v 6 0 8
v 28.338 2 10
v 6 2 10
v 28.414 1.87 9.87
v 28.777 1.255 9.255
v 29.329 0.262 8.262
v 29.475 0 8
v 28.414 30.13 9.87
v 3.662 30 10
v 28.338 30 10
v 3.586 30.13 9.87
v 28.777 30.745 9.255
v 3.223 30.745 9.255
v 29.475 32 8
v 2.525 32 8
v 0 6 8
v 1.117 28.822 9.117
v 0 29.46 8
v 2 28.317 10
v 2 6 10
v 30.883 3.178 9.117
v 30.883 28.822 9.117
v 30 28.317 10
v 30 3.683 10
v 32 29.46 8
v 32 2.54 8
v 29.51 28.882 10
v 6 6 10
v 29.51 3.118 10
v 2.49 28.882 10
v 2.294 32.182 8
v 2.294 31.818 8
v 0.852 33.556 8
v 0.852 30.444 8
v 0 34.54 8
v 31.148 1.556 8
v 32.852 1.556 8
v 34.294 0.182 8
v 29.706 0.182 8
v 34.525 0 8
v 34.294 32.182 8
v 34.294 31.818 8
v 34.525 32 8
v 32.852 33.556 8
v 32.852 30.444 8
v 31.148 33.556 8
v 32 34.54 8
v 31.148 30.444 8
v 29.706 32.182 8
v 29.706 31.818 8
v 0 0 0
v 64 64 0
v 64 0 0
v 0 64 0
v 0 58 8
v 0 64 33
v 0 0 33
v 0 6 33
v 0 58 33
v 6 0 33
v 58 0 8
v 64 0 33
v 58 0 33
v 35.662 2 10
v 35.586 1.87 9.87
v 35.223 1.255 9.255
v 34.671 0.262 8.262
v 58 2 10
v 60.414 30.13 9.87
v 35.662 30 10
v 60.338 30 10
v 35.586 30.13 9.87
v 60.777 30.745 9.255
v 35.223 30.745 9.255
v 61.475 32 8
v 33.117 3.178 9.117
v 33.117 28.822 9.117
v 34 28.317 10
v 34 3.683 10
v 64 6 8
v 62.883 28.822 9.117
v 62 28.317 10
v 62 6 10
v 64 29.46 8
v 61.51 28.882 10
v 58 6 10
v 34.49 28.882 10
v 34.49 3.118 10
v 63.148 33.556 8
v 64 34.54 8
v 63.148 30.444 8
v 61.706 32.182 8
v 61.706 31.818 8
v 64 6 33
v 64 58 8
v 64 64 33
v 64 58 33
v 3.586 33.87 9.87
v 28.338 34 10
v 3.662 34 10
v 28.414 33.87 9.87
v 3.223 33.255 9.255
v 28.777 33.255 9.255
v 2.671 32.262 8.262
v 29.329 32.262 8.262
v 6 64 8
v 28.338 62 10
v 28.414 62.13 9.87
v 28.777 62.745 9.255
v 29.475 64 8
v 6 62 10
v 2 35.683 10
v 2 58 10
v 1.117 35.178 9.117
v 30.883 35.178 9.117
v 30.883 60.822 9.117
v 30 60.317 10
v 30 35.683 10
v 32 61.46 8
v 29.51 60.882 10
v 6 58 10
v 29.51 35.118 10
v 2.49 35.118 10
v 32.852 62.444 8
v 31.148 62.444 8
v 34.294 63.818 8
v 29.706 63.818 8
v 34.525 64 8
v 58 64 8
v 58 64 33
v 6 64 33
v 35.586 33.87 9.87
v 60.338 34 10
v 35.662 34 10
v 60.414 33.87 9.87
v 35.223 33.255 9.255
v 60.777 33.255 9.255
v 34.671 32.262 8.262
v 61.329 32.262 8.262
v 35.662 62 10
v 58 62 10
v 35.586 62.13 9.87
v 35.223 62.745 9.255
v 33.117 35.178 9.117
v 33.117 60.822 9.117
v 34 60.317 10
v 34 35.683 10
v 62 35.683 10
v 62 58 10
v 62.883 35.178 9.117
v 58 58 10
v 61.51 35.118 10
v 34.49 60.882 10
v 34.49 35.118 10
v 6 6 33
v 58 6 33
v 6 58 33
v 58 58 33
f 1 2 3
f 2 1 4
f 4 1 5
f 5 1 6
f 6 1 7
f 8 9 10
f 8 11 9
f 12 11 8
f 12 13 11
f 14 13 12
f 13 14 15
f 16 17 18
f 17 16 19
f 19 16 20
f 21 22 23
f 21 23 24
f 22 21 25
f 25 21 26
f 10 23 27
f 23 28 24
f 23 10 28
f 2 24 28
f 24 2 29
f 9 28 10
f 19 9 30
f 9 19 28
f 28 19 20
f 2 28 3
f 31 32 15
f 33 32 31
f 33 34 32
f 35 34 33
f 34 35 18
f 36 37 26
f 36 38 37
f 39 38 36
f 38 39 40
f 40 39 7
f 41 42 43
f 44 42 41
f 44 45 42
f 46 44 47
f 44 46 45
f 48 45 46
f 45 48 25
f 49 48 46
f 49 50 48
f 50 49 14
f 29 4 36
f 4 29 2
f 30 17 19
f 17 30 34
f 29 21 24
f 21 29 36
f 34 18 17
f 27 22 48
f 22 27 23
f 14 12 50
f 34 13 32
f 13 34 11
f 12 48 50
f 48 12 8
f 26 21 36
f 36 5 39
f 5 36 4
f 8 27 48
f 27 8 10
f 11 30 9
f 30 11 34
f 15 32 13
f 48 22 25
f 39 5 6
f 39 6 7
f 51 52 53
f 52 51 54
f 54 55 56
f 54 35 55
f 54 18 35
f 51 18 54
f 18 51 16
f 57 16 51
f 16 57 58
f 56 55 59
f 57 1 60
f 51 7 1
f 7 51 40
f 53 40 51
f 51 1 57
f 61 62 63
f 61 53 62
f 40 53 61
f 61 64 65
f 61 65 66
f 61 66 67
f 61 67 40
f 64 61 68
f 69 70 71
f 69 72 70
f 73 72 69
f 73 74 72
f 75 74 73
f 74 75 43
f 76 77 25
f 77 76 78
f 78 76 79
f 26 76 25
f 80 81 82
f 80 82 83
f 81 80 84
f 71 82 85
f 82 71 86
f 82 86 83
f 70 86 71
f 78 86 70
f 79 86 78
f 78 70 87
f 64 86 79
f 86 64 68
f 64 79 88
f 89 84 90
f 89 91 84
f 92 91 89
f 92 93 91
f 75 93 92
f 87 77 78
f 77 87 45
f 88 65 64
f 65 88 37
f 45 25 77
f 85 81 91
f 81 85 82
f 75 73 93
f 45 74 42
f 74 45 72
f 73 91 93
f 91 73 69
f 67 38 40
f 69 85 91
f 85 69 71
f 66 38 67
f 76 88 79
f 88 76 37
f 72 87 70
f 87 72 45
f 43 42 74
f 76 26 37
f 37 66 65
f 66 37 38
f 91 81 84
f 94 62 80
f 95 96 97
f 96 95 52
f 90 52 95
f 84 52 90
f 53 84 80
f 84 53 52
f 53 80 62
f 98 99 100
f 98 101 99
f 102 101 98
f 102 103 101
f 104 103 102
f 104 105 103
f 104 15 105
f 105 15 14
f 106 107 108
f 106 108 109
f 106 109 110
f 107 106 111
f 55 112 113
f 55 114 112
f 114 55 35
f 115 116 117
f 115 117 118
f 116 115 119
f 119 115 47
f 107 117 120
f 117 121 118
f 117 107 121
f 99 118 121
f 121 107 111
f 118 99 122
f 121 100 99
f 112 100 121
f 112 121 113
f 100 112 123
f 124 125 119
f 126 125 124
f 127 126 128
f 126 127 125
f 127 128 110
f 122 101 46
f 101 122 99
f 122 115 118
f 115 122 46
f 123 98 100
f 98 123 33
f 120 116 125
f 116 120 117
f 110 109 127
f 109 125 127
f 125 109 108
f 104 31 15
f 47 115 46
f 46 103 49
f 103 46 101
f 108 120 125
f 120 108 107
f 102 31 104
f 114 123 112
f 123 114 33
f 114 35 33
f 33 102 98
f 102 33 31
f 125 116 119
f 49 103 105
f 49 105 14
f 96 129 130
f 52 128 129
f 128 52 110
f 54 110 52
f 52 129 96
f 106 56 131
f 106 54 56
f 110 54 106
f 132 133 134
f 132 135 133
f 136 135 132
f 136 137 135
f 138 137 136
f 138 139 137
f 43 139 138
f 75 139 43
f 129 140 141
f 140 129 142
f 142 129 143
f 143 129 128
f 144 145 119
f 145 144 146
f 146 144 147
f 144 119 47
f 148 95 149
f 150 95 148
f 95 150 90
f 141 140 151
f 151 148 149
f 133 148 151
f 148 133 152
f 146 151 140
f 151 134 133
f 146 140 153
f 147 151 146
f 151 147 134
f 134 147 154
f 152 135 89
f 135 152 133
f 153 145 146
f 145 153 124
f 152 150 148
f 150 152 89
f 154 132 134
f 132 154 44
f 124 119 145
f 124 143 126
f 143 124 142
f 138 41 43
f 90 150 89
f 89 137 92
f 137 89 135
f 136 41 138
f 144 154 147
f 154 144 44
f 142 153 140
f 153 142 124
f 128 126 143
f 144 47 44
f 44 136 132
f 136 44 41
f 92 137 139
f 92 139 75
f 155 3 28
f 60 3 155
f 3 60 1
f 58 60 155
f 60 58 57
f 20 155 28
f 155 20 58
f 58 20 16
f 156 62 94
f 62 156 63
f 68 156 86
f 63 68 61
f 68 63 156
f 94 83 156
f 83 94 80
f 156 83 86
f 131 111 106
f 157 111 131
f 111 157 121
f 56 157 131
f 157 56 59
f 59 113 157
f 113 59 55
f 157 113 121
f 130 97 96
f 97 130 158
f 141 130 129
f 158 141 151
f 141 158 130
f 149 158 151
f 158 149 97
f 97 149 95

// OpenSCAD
// file: ModularDungeonTileLibrary.scad
//Constants
wallleft = 0;
wallbottom = 1;
wallright = 2;
walltop = 3;
wallcenter = 4;
walldoubleright = 5;


//Variables
size = 32;
connectorlength = size-10;
connectorwidth = 6;
connectorheight = 4;
baseheight = 8;
topperheight = 2;
topperrounded = true;
walllength = size;
wallheight = 25;
wallwidth = 6;
wallwidththin = 4;


//Functions
function hypotenuse_ra(side_a, side_b) =
    sqrt(pow(side_a, 2) + pow(side_b, 2));
    
    
//Modules    
module mtdl_Base_Connector(cw,cl,ch) {
    translate([-connectorwidth/2,-connectorlength/2,-connectorheight/2]) {
        cube([cw,cl,ch/2]);
        translate([cw/3,0,ch/2])
            cube([cw/3,cl,ch/2]);
        translate([-(cw-2)/2,cl/2-2,0])
            cube([cw+4,4,ch]);
    }
}

module mdtl_Base(s,bh)
{
    cube([s,s,bh]);
}

module mdtl_Topper(s,bh,th,tr)
{
    if (tr) {
        translate([0,0,bh])
            intersection() {
                difference () {
                        cube([s,s,th]);
                        union () {
                        rotate(a=45, v=[1,0,0])
                            cube([s,th*2,th*2]);
                        translate([0,s,0])
                            rotate(a=45, v=[1,0,0])
                                cube([s,th*2,th*2]);
                        rotate(a=-45, v=[0,1,0])
                            cube([th*2,s,th*2]);
                        translate([s,0,0])
                            rotate(a=-45, v=[0,1,0])
                                cube([th*2,s,th*2]);
                        }
                }
                translate([s/2,s/2,0])
                    cylinder(
                        h=th, 
                        r1=hypotenuse_ra(s/2-1.2, s/2-1.2), 
                        r2=hypotenuse_ra(s/2-th-.8, s/2-th-.8), 
                        center=false, 
                        $fa=.1);
            }    
    }
    else {
        translate([0,0,bh])
            difference() {
                cube([s,s,th]);
                union () {
                rotate(a=45, v=[1,0,0])
                    cube([s,th*2,th*2]);
                translate([0,s,0])
                    rotate(a=45, v=[1,0,0])
                        cube([s,th*2,th*2]);
                rotate(a=-45, v=[0,1,0])
                    cube([th*2,s,th*2]);
                translate([s,0,0])
                    rotate(a=-45, v=[0,1,0])
                        cube([th*2,s,th*2]);
                }
            }    
    }
}

module mdtl_Base_1x1(s,bh,th,tr) 
{
    difference () {
        union () {
            mdtl_Base(s,bh);
            mdtl_Topper(s,bh,th,tr);
        }
//        union () {
//            translate([size/2,size,baseheight/2])
//                rotate([0,180,0])
//                    mtdl_Base_Connector(connectorwidth,connectorlength,connectorheight);
//            translate([size/2,0,baseheight/2])
//                rotate([0,180,0])
//                    mtdl_Base_Connector(connectorwidth,connectorlength,connectorheight);
//            translate([size,size/2,baseheight/2])
//                rotate([0,180,90])
//                    mtdl_Base_Connector(connectorwidth,connectorlength,connectorheight);
//            translate([0,size/2,baseheight/2])
//                rotate([0,180,90])
//                    mtdl_Base_Connector(connectorwidth,connectorlength,connectorheight);
//        }
    }
}

module mdtl_Base_1x2(s,bh,th,tr)
{
    union () {
        mdtl_Base_1x1(s,bh,th,tr);
        translate([s,0,0])
            mdtl_Base_1x1(s,bh,th,tr);
    }
}
 
module mdtl_Base_2x2(s,bh,th,tr)
{
    union () {
        mdtl_Base_1x2(s,bh,th,tr);
        translate([0,s,0])
            mdtl_Base_1x2(s,bh,th,tr);
    }
}
 
module mdtl_Base_2x4(s,bh,th,tr)
{
    union () {
        mdtl_Base_2x2(s,bh,th,tr);
        translate([s*2,0,0])
            mdtl_Base_2x2(s,bh,th,tr);
    }
}
 
module mdtl_Base_4x4(s,bh,th,tr)
{
    union () {
        mdtl_Base_2x4(s,bh,th,tr);
        translate([0,s*2,0])
            mdtl_Base_2x4(s,bh,th,tr);
    }
}
 
module mdtl_Wall_1(w,l,h)
{
    translate([0,0,baseheight])
        cube([w,l,h]);   
}

module mdtl_Wall_1_Position(w,l,h,p)
{
    if (p==0) {
        mdtl_Wall_1(w,l,h);
    }
    
    else if (p==1) {
        rotate(a=-90)
           translate([-w,0,0])
               mdtl_Wall_1(w,l,h);       
    }
    
    else if (p==2) {
        translate([(size)-w,0,0])
            mdtl_Wall_1(w,l,h);
    }
    
    else if (p==3) {
        rotate(a=-90)
            translate([-l,0,0])
                mdtl_Wall_1(w,l,h);
    }
    
    else if (p==4) {
        translate([(size)-w/2,0,0])
            mdtl_Wall_1(w,l,h);
    }
    
    else if (p==5) {
        translate([(size*2)-w,0,0])
           mdtl_Wall_1(w,l,h);       
    }
}

module mdtl_Wall_2(w,l,h)
{
    union() {
        mdtl_Wall_1(w,l,h);
        translate([0,l,0])
            mdtl_Wall_1(w,l,h);
    }
}

module mdtl_Wall_2_Position(w,l,h,p)
{
    if (p==0) {
        mdtl_Wall_2(w,l,h);
    }
    
    else if (p==1) {
        rotate(a=-90)
            translate([-w,0,0])
                mdtl_Wall_2(w,l,h);
    }
    
    else if (p==2) {
    translate([(size*2)-w,0,0])
        mdtl_Wall_2(w,l,h);
    }
    
    else if (p==3) {
        rotate(a=-90)
            translate([-l*2,0,0])
                mdtl_Wall_2(w,l,h);
    }
    
    else if (p==4) {
        translate([(size)-w/2,0,0])
            mdtl_Wall_2(w,l,h);
    }
}
// main file
include <ModularDungeonTileLibrary.scad>; 

mdtl_Base_2x2(size,baseheight,topperheight,topperrounded);
//Create Pillar with modified wall
mdtl_Wall_2_Position(wallwidth,wallwidth/2,wallheight,wallleft);
mdtl_Wall_2_Position(wallwidth,wallwidth/2,wallheight,wallright);
translate([0,walllength*2-wallwidth,0]) {
    mdtl_Wall_2_Position(wallwidth,wallwidth/2,wallheight,wallleft);
    mdtl_Wall_2_Position(wallwidth,wallwidth/2,wallheight,wallright);
}
